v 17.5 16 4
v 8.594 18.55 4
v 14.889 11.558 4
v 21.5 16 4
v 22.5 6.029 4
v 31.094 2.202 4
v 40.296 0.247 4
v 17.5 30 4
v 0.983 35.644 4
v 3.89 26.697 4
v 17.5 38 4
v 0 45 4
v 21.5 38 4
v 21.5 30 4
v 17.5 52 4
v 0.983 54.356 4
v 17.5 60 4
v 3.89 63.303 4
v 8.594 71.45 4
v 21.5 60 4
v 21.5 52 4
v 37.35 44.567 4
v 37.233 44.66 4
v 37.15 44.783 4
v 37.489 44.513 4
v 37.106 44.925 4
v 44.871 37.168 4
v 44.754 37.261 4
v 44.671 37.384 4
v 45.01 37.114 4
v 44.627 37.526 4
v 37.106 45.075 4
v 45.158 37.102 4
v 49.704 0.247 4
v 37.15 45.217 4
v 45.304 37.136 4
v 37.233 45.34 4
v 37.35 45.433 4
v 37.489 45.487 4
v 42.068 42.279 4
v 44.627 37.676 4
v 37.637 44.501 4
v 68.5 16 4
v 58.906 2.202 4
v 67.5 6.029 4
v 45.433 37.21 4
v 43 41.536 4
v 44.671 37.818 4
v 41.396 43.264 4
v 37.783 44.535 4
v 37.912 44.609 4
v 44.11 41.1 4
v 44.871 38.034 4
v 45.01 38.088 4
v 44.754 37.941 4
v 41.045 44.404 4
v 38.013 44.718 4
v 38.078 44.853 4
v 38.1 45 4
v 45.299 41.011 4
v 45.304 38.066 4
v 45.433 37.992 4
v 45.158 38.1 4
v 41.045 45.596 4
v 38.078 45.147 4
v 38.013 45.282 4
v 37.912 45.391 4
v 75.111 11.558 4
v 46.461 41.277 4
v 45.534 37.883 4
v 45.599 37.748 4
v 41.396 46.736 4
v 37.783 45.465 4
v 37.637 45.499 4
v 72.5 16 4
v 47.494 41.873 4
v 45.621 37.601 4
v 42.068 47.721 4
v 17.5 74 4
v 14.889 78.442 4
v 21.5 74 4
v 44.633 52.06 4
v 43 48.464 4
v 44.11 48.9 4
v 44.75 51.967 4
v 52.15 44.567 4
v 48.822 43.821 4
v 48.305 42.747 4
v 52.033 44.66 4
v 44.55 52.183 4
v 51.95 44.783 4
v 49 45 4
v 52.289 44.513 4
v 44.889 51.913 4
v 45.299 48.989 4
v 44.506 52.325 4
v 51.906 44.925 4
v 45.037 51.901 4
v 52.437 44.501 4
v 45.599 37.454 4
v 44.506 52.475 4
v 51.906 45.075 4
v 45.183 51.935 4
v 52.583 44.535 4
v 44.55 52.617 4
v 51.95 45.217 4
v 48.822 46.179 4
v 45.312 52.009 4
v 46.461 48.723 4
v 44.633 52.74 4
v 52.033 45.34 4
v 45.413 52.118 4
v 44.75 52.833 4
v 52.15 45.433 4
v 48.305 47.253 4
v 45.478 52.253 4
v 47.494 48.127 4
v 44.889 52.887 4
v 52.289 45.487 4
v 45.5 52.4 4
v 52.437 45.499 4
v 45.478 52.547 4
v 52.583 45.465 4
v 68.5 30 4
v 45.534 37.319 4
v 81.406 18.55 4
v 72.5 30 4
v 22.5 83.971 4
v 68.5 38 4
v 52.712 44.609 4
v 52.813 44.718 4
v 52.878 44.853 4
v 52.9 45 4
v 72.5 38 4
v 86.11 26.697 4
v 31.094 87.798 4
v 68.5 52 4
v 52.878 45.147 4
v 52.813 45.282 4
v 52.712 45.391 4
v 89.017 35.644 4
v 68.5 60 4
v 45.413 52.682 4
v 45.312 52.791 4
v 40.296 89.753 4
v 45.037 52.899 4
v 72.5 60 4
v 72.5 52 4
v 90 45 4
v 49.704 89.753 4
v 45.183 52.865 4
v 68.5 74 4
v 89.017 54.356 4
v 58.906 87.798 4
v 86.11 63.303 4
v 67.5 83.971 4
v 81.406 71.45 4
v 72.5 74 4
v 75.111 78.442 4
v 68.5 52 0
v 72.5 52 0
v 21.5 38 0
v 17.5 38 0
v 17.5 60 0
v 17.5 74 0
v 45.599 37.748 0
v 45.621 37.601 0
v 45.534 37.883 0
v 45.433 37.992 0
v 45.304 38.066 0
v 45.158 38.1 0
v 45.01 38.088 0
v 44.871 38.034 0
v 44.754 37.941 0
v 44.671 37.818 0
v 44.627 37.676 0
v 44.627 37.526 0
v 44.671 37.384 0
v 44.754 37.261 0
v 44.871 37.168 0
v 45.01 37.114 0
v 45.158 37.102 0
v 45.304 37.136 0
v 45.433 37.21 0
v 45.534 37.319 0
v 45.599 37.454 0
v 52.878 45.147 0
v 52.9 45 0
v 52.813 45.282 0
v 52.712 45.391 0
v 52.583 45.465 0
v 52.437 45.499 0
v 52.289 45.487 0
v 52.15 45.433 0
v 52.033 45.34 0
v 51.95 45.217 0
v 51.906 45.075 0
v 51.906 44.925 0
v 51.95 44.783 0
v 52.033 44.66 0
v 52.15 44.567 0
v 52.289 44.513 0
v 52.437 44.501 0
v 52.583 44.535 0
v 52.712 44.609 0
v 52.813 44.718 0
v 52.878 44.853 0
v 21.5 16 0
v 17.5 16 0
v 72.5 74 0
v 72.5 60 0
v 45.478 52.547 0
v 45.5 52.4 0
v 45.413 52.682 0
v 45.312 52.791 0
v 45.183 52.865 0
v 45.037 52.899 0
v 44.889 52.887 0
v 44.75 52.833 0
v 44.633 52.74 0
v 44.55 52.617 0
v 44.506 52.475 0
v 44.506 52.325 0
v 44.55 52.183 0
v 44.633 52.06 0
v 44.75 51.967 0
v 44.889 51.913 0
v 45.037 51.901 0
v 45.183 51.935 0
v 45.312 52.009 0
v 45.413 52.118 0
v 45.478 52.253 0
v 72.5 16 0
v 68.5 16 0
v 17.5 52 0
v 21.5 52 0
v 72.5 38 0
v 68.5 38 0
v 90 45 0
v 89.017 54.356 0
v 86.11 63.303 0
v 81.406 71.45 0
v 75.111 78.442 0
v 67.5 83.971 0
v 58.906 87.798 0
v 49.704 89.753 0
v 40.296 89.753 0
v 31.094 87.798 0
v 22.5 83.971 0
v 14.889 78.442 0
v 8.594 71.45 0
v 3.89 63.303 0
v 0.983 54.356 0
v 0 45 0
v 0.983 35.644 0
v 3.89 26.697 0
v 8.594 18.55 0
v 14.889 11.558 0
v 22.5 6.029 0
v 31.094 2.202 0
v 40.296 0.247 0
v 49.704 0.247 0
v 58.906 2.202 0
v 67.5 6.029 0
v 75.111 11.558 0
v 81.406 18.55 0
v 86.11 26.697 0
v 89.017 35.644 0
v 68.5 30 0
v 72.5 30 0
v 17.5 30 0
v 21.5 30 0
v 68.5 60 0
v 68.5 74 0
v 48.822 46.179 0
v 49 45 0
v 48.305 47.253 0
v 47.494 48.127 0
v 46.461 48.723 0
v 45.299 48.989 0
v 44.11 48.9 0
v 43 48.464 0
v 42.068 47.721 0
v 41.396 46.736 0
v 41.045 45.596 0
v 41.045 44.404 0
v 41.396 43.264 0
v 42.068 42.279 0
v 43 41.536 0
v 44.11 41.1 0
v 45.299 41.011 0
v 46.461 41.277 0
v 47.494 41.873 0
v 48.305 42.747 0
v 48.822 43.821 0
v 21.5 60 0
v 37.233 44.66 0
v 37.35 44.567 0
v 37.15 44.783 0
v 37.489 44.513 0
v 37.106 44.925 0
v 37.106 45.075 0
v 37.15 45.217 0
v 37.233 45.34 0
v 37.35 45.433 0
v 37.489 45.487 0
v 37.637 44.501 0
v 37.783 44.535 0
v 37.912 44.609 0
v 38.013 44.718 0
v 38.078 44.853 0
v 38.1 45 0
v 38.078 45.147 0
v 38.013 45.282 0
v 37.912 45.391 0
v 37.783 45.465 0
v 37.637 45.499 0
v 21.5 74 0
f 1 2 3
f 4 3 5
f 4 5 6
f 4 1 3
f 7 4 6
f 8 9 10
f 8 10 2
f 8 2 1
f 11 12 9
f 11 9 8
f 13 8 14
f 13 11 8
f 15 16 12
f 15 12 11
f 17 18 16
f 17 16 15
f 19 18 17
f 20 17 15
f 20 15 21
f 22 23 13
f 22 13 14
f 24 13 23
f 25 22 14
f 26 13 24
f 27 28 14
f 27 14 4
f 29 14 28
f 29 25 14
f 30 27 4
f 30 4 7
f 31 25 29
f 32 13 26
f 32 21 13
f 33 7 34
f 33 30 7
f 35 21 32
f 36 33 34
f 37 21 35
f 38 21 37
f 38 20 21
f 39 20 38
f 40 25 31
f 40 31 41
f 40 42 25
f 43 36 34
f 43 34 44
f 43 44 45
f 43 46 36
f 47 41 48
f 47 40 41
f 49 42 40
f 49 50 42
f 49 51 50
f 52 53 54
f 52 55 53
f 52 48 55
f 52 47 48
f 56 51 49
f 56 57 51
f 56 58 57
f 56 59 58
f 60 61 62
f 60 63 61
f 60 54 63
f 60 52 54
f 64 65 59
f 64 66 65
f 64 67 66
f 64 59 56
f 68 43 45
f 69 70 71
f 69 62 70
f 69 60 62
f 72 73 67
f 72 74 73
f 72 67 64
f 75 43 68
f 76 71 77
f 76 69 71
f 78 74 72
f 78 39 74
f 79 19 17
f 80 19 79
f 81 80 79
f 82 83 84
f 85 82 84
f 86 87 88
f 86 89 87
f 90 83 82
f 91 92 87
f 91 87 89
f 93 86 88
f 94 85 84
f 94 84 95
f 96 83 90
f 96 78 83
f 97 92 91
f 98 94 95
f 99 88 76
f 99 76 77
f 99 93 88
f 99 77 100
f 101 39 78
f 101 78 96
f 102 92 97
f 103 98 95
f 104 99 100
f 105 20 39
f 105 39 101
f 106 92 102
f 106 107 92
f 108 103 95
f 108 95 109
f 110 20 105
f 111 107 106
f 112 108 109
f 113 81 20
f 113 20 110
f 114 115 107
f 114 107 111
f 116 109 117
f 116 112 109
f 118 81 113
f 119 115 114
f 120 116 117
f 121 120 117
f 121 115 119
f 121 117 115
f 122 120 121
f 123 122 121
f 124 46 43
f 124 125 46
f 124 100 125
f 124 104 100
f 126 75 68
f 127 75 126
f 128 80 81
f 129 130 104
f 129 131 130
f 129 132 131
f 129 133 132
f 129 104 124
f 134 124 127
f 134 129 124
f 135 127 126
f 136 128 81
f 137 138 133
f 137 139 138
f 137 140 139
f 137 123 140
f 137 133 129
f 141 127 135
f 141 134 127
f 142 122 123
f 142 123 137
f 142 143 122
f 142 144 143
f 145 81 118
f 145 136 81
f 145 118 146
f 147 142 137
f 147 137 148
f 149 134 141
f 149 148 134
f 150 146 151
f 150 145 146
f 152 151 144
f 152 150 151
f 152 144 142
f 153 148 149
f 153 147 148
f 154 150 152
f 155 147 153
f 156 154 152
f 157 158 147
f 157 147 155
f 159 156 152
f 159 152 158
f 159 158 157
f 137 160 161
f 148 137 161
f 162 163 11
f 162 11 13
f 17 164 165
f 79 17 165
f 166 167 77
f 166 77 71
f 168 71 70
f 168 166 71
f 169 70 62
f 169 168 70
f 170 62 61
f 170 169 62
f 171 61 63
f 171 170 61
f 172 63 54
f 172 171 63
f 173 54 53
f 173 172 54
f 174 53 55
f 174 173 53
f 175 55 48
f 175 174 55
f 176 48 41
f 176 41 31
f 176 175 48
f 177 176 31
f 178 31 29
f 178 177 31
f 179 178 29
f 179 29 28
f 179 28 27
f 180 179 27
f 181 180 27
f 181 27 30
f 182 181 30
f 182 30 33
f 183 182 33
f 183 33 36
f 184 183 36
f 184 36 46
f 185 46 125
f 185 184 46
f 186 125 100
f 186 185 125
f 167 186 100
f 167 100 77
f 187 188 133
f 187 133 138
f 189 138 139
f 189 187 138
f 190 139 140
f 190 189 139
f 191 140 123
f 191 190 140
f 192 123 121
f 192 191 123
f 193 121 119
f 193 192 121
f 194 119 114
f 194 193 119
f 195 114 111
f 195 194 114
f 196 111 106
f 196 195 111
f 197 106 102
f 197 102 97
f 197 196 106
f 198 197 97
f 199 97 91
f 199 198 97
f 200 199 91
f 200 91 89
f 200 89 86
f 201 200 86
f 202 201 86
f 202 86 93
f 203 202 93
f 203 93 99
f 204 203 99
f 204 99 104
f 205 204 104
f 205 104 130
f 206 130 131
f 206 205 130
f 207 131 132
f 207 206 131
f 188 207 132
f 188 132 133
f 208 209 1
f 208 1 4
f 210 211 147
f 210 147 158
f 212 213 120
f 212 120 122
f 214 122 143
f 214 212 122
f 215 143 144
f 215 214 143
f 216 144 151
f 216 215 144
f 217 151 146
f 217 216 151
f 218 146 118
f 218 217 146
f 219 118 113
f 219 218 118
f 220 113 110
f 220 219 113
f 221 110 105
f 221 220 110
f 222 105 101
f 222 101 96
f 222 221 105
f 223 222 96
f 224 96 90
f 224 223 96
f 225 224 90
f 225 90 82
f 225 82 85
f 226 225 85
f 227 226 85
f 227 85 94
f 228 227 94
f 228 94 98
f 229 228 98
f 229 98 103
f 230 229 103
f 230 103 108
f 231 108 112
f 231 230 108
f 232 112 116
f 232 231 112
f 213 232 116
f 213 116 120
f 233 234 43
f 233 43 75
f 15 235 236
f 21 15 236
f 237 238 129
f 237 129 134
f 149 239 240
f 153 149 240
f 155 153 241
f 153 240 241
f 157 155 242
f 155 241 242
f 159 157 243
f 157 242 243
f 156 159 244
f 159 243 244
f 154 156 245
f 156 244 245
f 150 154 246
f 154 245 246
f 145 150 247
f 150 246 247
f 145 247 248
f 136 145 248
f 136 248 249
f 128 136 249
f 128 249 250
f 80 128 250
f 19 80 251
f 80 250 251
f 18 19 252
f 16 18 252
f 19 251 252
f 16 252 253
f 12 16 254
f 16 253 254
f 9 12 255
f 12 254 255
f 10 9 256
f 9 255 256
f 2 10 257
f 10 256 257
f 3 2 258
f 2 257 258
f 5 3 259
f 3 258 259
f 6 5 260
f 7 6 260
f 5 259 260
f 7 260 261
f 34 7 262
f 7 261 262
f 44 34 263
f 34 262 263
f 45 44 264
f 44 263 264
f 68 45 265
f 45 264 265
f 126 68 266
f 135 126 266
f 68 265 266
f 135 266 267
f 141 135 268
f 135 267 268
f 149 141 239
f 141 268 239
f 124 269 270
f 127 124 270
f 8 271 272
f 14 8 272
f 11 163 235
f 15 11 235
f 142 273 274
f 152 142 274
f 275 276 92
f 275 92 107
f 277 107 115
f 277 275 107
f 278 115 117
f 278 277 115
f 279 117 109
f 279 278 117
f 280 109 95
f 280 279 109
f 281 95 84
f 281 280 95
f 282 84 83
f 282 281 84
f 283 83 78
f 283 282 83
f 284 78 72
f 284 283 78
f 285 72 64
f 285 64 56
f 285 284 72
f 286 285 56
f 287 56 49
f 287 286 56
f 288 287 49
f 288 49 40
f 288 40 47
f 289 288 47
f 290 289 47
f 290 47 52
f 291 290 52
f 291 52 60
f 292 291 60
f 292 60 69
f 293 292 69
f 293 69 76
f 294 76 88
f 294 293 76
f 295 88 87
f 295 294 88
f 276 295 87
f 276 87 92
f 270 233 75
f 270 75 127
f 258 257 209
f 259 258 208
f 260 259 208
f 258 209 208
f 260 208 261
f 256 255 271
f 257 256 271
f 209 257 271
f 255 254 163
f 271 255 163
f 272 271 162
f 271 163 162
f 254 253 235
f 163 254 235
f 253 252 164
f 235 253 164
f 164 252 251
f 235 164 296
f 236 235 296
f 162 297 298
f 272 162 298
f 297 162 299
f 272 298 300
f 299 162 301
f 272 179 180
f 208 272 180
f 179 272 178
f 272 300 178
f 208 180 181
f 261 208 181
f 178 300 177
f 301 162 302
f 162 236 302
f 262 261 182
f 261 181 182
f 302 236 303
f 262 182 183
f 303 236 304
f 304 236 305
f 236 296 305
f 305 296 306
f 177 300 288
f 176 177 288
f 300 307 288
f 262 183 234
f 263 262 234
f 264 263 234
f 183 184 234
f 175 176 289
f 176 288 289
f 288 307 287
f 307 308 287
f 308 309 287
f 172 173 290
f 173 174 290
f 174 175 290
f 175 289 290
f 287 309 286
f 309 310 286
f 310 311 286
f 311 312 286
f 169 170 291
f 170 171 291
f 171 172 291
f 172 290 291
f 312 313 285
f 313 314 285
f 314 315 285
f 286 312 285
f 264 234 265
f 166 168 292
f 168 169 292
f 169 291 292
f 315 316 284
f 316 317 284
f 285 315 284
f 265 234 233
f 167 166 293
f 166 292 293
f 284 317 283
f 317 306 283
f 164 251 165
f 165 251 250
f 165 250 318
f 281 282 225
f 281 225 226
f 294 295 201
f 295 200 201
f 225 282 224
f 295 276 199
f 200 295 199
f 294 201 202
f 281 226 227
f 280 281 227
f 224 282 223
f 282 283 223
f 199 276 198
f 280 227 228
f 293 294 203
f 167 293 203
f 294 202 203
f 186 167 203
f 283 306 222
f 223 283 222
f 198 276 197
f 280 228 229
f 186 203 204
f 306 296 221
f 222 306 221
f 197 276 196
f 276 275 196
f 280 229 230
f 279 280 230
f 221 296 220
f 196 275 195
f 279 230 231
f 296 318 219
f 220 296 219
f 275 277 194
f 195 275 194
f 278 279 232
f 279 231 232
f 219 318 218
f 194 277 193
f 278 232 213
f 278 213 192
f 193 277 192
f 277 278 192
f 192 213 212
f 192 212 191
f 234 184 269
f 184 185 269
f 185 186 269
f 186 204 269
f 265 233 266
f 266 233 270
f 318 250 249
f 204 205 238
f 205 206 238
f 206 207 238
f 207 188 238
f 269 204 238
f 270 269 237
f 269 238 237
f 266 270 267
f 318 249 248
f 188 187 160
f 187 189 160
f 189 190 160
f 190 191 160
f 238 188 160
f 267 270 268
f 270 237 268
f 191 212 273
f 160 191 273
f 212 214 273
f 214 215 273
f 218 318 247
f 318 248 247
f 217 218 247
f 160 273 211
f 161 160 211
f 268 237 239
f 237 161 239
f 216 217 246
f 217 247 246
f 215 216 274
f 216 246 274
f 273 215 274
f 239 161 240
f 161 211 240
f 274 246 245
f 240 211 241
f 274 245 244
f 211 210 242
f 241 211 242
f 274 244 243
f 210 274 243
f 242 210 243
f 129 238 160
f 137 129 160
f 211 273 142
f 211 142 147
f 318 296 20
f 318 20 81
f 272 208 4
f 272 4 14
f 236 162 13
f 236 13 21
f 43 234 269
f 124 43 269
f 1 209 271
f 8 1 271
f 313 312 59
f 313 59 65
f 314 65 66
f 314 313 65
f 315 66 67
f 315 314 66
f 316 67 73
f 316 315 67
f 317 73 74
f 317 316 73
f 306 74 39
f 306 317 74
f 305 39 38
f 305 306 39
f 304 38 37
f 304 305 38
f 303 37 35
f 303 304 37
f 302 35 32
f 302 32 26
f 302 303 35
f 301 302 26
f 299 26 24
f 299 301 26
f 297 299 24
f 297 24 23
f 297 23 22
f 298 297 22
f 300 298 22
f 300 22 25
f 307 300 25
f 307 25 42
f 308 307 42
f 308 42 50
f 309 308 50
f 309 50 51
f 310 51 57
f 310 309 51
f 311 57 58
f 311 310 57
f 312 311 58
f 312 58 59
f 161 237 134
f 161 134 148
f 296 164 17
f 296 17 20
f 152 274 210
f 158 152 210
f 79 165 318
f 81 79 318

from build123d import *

# Parameters (mm, degrees)
SKETCH1_R           = 45
SKETCH1_R_2         = 0.5
SKETCH1_R_3         = 4
SKETCH1_W           = 4
SKETCH1_H           = 14
BOSS_EXTRUDE1_DEPTH = 4


with BuildPart() as part:
    # Sketch1 → Boss-Extrude1 (new body)
    with BuildSketch(Plane.XY):
        with Locations((45, 45)):
            Circle(SKETCH1_R)
        with Locations((37.6, 45)):
            Circle(SKETCH1_R_2, mode=Mode.SUBTRACT)
        with Locations((52.4, 45)):
            Circle(SKETCH1_R_2, mode=Mode.SUBTRACT)
        with Locations((45.121025162, 37.600989734)):
            Circle(SKETCH1_R_2, mode=Mode.SUBTRACT)
        with Locations((45, 52.4)):
            Circle(SKETCH1_R_2, mode=Mode.SUBTRACT)
        with Locations((45, 45)):
            Circle(SKETCH1_R_3, mode=Mode.SUBTRACT)
        with Locations((19.5, 67)):
            Rectangle(SKETCH1_W, SKETCH1_H, mode=Mode.SUBTRACT)
        with Locations((70.5, 45)):
            Rectangle(SKETCH1_W, SKETCH1_H, mode=Mode.SUBTRACT)
        with Locations((70.5, 23)):
            Rectangle(SKETCH1_W, SKETCH1_H, mode=Mode.SUBTRACT)
        with Locations((19.5, 45)):
            Rectangle(SKETCH1_W, SKETCH1_H, mode=Mode.SUBTRACT)
        with Locations((19.5, 23)):
            Rectangle(SKETCH1_W, SKETCH1_H, mode=Mode.SUBTRACT)
        with Locations((70.5, 67)):
            Rectangle(SKETCH1_W, SKETCH1_H, mode=Mode.SUBTRACT)
    extrude(amount=BOSS_EXTRUDE1_DEPTH)


solid = part.part
